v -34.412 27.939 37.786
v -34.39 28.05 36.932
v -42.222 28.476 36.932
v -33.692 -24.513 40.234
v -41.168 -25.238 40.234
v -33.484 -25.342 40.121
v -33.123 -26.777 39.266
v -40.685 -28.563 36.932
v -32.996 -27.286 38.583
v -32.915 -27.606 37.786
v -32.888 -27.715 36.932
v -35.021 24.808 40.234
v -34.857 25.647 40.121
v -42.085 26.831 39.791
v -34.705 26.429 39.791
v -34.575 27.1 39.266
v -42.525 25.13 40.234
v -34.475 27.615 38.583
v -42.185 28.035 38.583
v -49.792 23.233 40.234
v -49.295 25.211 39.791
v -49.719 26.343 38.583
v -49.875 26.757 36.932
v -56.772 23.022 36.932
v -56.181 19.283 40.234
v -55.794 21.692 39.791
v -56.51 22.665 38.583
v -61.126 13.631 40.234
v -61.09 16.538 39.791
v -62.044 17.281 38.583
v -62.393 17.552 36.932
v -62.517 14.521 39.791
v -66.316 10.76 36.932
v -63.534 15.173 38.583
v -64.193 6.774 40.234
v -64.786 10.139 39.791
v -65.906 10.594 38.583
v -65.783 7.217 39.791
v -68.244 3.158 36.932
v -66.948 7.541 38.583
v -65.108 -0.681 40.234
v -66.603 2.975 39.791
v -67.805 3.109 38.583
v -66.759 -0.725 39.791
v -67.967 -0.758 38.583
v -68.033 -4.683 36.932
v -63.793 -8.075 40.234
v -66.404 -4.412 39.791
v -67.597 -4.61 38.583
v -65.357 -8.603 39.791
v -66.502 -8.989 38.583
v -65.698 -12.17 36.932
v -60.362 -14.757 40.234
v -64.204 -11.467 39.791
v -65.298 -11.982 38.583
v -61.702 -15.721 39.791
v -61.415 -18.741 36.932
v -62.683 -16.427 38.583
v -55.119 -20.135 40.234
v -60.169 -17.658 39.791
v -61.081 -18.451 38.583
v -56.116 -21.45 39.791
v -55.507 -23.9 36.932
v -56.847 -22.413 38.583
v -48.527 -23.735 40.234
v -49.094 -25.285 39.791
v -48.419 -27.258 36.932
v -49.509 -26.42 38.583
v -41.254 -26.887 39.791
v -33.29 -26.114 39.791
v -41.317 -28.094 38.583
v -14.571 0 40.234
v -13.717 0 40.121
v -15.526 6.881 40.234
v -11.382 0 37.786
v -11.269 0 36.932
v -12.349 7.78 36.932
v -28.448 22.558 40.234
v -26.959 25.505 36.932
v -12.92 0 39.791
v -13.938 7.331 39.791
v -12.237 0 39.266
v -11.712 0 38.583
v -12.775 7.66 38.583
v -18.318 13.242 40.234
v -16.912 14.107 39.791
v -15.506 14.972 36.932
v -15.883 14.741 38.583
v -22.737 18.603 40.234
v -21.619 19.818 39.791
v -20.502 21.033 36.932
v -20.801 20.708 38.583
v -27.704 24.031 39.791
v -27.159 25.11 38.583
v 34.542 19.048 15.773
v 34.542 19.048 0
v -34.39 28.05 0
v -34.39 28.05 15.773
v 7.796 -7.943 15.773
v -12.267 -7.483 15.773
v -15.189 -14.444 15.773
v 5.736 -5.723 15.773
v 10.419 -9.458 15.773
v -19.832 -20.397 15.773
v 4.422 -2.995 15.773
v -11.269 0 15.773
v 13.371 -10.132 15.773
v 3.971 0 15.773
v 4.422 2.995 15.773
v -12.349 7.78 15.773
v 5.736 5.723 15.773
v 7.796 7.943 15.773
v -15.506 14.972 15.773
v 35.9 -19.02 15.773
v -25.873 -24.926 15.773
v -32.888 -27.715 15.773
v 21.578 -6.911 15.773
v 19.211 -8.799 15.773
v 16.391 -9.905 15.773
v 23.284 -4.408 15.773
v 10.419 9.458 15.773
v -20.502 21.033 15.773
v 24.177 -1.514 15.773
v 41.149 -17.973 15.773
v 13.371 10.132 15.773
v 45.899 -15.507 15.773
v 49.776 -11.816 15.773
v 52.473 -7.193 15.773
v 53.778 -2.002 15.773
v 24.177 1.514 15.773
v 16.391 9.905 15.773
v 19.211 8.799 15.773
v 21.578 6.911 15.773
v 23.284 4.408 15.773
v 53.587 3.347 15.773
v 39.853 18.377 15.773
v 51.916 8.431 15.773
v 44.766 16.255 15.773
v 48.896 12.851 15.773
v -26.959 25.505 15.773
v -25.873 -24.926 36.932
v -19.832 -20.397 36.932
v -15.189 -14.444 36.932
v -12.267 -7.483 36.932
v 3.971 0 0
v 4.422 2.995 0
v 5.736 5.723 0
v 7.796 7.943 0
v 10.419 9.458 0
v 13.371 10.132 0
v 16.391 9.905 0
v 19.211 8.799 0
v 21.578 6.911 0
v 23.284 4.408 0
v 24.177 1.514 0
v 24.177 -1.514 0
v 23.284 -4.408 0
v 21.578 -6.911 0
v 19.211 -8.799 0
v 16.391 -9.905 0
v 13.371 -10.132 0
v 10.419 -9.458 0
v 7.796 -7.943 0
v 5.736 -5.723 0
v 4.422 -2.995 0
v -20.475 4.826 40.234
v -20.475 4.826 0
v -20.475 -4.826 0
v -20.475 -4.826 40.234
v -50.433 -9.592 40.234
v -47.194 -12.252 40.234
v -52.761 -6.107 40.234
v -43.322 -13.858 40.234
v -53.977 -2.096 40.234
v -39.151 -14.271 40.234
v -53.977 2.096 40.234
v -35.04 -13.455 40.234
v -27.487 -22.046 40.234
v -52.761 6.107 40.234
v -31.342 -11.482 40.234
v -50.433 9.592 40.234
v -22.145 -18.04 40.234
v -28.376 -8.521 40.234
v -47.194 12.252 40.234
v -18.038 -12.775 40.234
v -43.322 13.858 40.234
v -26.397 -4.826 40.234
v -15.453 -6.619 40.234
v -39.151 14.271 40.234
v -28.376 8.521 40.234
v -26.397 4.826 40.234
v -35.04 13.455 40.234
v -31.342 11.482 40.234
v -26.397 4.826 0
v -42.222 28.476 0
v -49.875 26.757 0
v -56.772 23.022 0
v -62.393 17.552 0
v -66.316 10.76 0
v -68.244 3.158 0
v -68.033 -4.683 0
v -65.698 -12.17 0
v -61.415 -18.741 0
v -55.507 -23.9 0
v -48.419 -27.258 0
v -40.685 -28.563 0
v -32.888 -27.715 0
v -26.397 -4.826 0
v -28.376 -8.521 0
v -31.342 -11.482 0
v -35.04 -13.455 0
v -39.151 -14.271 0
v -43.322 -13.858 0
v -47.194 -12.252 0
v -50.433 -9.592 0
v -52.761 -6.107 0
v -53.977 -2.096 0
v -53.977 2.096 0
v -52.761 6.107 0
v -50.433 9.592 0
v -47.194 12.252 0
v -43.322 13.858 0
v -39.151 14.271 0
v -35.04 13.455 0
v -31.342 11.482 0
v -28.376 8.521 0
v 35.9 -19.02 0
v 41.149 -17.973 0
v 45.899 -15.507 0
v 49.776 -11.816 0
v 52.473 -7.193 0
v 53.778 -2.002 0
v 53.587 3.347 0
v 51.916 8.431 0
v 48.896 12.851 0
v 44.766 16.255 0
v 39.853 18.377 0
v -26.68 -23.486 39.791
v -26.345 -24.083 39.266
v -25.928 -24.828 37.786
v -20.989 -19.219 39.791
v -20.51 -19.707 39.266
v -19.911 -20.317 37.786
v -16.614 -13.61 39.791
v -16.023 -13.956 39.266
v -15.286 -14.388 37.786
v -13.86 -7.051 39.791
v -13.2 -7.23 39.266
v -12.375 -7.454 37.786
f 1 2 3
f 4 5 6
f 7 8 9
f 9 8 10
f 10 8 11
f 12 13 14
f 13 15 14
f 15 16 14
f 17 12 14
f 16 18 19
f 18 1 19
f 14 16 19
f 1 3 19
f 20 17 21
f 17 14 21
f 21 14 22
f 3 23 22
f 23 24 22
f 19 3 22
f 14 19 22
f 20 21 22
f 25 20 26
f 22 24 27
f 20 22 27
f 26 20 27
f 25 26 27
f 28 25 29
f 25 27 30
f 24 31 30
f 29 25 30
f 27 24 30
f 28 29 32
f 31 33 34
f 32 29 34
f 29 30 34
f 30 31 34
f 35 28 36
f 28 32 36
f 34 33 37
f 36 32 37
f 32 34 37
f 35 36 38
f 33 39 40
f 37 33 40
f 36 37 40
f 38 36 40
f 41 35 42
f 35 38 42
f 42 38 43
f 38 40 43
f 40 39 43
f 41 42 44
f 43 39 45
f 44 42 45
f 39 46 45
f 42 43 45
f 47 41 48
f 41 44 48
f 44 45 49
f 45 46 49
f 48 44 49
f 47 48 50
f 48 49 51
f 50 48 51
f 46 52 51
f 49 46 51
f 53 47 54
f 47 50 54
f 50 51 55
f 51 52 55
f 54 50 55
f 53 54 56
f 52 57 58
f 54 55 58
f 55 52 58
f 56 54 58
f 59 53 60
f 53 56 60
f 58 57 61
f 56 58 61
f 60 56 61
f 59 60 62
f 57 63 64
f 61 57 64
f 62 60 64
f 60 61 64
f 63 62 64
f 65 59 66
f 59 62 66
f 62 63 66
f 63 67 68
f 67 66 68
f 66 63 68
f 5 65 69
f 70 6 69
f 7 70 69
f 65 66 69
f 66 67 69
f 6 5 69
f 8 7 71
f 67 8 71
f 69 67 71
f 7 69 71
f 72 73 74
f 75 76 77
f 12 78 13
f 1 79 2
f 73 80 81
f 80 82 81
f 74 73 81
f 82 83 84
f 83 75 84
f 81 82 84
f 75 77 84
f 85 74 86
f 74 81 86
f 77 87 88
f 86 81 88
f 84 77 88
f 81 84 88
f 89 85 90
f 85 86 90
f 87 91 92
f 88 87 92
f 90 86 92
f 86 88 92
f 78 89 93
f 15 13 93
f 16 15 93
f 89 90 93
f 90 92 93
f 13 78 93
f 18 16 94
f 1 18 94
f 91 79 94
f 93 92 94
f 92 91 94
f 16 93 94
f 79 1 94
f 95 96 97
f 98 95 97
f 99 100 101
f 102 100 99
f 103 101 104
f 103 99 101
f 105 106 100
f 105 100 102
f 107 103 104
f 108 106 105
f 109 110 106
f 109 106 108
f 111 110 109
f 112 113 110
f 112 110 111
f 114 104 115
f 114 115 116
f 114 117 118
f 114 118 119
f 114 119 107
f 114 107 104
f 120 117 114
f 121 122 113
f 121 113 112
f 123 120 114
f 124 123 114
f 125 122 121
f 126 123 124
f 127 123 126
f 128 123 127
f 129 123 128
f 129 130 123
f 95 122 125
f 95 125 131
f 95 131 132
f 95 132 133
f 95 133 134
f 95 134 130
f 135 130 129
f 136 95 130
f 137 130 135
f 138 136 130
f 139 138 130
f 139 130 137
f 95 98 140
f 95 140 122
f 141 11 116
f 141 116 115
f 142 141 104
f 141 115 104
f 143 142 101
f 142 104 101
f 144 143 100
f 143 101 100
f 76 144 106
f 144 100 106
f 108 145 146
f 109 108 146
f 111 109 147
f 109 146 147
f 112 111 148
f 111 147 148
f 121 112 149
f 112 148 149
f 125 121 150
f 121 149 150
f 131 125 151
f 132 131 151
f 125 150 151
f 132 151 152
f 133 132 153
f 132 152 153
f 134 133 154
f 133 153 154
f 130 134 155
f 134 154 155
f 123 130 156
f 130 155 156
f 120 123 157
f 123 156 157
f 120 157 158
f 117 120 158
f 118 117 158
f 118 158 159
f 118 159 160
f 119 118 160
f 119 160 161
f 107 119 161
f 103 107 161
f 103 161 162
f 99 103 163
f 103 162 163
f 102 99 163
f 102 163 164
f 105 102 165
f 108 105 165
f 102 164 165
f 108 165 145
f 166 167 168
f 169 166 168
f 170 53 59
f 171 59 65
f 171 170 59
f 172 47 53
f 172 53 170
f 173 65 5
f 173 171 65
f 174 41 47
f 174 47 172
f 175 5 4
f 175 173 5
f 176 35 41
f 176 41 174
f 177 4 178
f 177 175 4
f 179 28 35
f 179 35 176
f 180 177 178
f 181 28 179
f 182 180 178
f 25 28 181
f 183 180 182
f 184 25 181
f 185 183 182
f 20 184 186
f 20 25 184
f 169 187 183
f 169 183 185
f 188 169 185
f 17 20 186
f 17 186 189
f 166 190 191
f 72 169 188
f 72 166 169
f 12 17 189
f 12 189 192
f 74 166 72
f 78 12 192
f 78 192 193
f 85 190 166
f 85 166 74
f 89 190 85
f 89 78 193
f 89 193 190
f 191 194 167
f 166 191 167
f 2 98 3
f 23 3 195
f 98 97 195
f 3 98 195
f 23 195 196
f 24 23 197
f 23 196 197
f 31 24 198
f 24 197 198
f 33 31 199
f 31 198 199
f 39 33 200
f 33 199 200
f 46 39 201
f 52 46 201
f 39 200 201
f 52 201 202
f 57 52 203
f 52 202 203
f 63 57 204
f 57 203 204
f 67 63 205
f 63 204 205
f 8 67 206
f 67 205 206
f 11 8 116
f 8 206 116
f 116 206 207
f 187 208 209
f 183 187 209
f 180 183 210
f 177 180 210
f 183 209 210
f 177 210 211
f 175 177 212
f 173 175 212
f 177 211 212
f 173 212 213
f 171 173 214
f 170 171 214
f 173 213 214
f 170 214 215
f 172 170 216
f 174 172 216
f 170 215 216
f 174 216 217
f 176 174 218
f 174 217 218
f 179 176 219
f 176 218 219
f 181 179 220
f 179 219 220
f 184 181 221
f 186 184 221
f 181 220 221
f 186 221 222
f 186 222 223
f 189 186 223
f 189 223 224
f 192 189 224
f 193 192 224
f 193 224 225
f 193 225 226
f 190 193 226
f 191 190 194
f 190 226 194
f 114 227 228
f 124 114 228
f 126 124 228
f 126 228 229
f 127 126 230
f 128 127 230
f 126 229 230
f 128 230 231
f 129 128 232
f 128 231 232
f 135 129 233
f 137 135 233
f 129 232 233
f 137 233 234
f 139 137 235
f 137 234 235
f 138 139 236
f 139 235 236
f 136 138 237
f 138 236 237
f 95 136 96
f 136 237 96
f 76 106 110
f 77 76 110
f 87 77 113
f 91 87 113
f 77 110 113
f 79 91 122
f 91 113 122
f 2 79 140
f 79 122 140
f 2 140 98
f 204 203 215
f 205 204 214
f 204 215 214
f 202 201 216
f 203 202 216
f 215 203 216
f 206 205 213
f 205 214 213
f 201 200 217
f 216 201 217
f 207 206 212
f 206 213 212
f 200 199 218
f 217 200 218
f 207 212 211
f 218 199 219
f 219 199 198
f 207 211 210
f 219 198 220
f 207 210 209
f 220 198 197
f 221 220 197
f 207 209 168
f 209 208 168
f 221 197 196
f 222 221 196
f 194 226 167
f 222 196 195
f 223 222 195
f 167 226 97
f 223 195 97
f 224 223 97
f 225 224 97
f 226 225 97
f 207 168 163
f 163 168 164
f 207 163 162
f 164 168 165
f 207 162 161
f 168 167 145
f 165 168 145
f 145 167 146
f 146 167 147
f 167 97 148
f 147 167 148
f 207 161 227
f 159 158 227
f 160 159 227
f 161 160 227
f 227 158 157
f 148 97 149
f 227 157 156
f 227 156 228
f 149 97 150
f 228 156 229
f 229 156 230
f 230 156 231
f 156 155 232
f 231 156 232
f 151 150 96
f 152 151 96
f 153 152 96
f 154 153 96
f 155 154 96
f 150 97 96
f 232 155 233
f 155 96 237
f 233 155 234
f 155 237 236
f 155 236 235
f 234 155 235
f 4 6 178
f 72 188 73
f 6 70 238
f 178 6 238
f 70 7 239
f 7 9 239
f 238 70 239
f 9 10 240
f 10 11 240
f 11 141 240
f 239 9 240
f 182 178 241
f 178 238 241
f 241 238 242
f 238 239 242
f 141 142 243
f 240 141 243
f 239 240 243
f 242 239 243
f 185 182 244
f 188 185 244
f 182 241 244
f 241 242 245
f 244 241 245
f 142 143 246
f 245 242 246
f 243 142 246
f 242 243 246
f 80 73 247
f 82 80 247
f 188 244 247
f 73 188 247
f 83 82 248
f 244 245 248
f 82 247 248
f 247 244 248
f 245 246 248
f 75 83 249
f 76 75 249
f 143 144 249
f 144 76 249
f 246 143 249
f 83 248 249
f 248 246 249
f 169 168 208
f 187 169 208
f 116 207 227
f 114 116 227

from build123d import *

# Parameters (mm, degrees)
F1_DEPTH = 15.7734
F2_DEPTH = 40.2336
F3_R     = 3.302


with BuildPart() as f1:
    # F0 (on Top) → F1 (new body)
    with BuildSketch(Plane.XY):
        with BuildLine():
            ThreePointArc((-34.39037, 28.049673), (-17.794691, 18.17528), (-11.269403, 0))
            ThreePointArc((-11.269403, 0), (-17.313196, -17.57485), (-32.887976, -27.715316))
            Line((-32.887976, -27.715316), (35.899774, -19.02012))
            ThreePointArc((35.899774, -19.02012), (53.871128, 0.678817), (34.542421, 19.04778))
            Line((34.542421, 19.04778), (-34.39037, 28.049673))
        make_face()
        with BuildLine():
            ThreePointArc((24.290597, 0), (14.130597, -10.16), (3.970597, 0))
            ThreePointArc((3.970597, 0), (14.130597, 10.16), (24.290597, 0))
        make_face(mode=Mode.SUBTRACT)
    extrude(amount=F1_DEPTH)

    # F0 (on Top) → F2 (join)
    with BuildSketch(Plane.XY):
        with BuildLine():
            ThreePointArc((-32.887976, -27.715316), (-17.313196, -17.57485), (-11.269403, 0))
            ThreePointArc((-11.269403, 0), (-17.794691, 18.17528), (-34.39037, 28.049673))
            ThreePointArc((-34.39037, 28.049673), (-68.409038, -0.769575), (-32.887976, -27.715316))
        make_face()
        with BuildLine():
            Line((-20.475368, 4.826), (-20.475368, 0))
            Line((-20.475368, 0), (-20.475368, -4.826))
            Line((-20.475368, -4.826), (-26.396638, -4.826))
            ThreePointArc((-26.396638, -4.826), (-54.131903, 0), (-26.396638, 4.826))
            Line((-26.396638, 4.826), (-20.475368, 4.826))
        make_face(mode=Mode.SUBTRACT)
    extrude(amount=F2_DEPTH)

    # F3
    f3_edges = [f1.edges().sort_by_distance(p)[0] for p in [
        (-46.80083, 27.715316, 40.2336),
    ]]
    fillet(f3_edges, radius=F3_R)


solid = f1.part
